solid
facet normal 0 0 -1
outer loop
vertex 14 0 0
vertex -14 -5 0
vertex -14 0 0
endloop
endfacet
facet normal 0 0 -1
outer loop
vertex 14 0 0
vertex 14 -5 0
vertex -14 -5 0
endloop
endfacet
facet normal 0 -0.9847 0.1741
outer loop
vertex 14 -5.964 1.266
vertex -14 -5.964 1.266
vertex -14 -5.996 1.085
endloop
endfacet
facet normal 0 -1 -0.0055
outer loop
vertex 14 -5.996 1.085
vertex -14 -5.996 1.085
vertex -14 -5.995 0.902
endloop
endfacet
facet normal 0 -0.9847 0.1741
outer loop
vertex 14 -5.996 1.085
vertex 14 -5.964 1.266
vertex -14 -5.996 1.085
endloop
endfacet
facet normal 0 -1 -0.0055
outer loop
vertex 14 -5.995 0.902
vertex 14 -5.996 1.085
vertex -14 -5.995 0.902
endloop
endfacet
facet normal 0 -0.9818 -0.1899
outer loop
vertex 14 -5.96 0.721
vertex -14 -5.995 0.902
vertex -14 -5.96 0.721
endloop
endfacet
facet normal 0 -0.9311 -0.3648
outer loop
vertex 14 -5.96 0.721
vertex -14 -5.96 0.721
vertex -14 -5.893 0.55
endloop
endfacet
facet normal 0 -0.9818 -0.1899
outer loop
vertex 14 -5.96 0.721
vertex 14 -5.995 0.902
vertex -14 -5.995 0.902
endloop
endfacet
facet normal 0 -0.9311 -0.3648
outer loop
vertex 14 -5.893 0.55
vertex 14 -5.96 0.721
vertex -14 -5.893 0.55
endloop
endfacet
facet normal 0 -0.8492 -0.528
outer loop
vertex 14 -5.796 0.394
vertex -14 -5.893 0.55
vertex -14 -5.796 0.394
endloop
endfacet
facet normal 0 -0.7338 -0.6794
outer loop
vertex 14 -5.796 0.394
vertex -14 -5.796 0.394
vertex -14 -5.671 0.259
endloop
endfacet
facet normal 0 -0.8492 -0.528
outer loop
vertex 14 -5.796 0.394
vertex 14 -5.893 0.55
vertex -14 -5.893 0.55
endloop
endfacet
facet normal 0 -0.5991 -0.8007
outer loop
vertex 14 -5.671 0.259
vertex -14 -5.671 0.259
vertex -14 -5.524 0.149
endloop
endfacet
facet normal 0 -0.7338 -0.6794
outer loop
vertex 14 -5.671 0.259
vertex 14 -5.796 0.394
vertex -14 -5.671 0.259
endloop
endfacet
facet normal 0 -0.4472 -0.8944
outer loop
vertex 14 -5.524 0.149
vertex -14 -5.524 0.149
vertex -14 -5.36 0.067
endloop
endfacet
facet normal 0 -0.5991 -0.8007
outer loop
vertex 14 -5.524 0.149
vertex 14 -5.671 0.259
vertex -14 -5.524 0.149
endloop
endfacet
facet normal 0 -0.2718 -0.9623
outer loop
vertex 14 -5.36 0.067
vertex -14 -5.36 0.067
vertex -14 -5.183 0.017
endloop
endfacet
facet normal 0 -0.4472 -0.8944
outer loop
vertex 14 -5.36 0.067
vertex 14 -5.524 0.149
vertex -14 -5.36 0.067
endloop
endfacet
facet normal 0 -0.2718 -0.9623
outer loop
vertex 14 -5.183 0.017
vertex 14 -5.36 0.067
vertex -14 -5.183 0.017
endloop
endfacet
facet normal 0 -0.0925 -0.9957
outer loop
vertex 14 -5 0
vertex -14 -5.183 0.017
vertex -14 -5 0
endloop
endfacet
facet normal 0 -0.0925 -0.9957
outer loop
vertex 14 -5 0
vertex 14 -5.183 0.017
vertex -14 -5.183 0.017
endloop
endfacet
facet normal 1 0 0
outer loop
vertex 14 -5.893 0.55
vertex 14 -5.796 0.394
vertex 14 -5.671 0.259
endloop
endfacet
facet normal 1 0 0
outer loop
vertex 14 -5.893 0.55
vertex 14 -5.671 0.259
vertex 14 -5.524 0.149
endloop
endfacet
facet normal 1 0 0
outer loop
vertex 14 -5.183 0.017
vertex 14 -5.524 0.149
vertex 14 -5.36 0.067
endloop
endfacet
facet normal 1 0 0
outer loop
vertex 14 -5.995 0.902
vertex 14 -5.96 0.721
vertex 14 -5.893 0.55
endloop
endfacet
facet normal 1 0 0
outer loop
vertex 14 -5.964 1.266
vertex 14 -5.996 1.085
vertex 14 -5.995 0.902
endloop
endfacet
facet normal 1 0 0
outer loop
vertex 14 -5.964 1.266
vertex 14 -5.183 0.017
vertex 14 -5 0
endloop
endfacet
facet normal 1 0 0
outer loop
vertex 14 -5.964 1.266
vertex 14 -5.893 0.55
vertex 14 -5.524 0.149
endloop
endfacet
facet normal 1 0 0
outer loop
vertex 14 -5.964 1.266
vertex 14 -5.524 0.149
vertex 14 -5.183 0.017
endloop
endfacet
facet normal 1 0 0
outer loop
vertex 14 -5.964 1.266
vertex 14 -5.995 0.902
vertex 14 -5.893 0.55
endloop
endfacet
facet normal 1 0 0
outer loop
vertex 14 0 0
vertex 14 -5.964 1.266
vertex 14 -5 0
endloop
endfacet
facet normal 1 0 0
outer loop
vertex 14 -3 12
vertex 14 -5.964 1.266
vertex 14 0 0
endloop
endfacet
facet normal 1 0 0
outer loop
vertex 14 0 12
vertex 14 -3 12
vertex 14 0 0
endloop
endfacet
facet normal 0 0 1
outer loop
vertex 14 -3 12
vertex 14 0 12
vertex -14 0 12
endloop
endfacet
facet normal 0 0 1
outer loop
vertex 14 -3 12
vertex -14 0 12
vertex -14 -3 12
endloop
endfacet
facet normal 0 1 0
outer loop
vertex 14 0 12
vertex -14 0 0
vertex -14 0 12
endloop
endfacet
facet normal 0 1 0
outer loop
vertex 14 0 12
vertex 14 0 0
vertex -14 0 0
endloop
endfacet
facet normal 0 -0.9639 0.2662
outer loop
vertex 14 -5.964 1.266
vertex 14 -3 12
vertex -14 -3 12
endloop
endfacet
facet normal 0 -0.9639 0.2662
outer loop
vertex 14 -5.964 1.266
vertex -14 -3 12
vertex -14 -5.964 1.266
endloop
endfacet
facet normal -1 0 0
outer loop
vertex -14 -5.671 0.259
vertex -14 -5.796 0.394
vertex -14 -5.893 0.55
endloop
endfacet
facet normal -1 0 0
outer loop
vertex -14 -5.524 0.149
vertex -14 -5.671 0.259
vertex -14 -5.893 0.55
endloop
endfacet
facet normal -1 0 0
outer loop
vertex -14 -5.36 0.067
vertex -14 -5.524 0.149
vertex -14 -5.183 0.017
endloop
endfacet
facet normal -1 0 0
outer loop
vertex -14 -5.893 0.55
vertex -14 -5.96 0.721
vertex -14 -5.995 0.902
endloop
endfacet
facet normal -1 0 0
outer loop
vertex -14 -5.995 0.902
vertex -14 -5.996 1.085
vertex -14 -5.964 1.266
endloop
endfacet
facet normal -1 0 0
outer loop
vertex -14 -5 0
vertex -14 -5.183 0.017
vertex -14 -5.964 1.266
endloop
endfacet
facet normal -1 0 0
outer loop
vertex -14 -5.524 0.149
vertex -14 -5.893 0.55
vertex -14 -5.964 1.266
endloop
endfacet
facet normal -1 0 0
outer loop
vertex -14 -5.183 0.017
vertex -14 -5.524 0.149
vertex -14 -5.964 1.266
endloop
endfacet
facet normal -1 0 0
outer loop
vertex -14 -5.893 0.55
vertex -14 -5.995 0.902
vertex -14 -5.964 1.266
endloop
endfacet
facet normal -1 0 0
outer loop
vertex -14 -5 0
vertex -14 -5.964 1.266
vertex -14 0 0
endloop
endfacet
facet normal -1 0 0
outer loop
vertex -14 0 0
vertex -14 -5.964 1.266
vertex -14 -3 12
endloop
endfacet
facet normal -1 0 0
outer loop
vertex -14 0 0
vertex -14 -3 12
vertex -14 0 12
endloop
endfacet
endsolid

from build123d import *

# Parameters (mm, degrees)
PAD_DEPTH = 14


with BuildPart() as part:
    # Sketch → Pad (new body, symmetric)
    with BuildSketch(Plane.YZ):
        with BuildLine():
            Line((0, 0), (0, 12))
            Line((0, 12), (-3, 12))
            Line((-3, 12), (-5.963927, 1.266168))
            ThreePointArc((-5.963927, 1.266168), (-5.795666, 0.394264), (-5, 0))
            Line((-5, 0), (0, 0))
        make_face()
    extrude(amount=PAD_DEPTH, both=True)


solid = part.part
